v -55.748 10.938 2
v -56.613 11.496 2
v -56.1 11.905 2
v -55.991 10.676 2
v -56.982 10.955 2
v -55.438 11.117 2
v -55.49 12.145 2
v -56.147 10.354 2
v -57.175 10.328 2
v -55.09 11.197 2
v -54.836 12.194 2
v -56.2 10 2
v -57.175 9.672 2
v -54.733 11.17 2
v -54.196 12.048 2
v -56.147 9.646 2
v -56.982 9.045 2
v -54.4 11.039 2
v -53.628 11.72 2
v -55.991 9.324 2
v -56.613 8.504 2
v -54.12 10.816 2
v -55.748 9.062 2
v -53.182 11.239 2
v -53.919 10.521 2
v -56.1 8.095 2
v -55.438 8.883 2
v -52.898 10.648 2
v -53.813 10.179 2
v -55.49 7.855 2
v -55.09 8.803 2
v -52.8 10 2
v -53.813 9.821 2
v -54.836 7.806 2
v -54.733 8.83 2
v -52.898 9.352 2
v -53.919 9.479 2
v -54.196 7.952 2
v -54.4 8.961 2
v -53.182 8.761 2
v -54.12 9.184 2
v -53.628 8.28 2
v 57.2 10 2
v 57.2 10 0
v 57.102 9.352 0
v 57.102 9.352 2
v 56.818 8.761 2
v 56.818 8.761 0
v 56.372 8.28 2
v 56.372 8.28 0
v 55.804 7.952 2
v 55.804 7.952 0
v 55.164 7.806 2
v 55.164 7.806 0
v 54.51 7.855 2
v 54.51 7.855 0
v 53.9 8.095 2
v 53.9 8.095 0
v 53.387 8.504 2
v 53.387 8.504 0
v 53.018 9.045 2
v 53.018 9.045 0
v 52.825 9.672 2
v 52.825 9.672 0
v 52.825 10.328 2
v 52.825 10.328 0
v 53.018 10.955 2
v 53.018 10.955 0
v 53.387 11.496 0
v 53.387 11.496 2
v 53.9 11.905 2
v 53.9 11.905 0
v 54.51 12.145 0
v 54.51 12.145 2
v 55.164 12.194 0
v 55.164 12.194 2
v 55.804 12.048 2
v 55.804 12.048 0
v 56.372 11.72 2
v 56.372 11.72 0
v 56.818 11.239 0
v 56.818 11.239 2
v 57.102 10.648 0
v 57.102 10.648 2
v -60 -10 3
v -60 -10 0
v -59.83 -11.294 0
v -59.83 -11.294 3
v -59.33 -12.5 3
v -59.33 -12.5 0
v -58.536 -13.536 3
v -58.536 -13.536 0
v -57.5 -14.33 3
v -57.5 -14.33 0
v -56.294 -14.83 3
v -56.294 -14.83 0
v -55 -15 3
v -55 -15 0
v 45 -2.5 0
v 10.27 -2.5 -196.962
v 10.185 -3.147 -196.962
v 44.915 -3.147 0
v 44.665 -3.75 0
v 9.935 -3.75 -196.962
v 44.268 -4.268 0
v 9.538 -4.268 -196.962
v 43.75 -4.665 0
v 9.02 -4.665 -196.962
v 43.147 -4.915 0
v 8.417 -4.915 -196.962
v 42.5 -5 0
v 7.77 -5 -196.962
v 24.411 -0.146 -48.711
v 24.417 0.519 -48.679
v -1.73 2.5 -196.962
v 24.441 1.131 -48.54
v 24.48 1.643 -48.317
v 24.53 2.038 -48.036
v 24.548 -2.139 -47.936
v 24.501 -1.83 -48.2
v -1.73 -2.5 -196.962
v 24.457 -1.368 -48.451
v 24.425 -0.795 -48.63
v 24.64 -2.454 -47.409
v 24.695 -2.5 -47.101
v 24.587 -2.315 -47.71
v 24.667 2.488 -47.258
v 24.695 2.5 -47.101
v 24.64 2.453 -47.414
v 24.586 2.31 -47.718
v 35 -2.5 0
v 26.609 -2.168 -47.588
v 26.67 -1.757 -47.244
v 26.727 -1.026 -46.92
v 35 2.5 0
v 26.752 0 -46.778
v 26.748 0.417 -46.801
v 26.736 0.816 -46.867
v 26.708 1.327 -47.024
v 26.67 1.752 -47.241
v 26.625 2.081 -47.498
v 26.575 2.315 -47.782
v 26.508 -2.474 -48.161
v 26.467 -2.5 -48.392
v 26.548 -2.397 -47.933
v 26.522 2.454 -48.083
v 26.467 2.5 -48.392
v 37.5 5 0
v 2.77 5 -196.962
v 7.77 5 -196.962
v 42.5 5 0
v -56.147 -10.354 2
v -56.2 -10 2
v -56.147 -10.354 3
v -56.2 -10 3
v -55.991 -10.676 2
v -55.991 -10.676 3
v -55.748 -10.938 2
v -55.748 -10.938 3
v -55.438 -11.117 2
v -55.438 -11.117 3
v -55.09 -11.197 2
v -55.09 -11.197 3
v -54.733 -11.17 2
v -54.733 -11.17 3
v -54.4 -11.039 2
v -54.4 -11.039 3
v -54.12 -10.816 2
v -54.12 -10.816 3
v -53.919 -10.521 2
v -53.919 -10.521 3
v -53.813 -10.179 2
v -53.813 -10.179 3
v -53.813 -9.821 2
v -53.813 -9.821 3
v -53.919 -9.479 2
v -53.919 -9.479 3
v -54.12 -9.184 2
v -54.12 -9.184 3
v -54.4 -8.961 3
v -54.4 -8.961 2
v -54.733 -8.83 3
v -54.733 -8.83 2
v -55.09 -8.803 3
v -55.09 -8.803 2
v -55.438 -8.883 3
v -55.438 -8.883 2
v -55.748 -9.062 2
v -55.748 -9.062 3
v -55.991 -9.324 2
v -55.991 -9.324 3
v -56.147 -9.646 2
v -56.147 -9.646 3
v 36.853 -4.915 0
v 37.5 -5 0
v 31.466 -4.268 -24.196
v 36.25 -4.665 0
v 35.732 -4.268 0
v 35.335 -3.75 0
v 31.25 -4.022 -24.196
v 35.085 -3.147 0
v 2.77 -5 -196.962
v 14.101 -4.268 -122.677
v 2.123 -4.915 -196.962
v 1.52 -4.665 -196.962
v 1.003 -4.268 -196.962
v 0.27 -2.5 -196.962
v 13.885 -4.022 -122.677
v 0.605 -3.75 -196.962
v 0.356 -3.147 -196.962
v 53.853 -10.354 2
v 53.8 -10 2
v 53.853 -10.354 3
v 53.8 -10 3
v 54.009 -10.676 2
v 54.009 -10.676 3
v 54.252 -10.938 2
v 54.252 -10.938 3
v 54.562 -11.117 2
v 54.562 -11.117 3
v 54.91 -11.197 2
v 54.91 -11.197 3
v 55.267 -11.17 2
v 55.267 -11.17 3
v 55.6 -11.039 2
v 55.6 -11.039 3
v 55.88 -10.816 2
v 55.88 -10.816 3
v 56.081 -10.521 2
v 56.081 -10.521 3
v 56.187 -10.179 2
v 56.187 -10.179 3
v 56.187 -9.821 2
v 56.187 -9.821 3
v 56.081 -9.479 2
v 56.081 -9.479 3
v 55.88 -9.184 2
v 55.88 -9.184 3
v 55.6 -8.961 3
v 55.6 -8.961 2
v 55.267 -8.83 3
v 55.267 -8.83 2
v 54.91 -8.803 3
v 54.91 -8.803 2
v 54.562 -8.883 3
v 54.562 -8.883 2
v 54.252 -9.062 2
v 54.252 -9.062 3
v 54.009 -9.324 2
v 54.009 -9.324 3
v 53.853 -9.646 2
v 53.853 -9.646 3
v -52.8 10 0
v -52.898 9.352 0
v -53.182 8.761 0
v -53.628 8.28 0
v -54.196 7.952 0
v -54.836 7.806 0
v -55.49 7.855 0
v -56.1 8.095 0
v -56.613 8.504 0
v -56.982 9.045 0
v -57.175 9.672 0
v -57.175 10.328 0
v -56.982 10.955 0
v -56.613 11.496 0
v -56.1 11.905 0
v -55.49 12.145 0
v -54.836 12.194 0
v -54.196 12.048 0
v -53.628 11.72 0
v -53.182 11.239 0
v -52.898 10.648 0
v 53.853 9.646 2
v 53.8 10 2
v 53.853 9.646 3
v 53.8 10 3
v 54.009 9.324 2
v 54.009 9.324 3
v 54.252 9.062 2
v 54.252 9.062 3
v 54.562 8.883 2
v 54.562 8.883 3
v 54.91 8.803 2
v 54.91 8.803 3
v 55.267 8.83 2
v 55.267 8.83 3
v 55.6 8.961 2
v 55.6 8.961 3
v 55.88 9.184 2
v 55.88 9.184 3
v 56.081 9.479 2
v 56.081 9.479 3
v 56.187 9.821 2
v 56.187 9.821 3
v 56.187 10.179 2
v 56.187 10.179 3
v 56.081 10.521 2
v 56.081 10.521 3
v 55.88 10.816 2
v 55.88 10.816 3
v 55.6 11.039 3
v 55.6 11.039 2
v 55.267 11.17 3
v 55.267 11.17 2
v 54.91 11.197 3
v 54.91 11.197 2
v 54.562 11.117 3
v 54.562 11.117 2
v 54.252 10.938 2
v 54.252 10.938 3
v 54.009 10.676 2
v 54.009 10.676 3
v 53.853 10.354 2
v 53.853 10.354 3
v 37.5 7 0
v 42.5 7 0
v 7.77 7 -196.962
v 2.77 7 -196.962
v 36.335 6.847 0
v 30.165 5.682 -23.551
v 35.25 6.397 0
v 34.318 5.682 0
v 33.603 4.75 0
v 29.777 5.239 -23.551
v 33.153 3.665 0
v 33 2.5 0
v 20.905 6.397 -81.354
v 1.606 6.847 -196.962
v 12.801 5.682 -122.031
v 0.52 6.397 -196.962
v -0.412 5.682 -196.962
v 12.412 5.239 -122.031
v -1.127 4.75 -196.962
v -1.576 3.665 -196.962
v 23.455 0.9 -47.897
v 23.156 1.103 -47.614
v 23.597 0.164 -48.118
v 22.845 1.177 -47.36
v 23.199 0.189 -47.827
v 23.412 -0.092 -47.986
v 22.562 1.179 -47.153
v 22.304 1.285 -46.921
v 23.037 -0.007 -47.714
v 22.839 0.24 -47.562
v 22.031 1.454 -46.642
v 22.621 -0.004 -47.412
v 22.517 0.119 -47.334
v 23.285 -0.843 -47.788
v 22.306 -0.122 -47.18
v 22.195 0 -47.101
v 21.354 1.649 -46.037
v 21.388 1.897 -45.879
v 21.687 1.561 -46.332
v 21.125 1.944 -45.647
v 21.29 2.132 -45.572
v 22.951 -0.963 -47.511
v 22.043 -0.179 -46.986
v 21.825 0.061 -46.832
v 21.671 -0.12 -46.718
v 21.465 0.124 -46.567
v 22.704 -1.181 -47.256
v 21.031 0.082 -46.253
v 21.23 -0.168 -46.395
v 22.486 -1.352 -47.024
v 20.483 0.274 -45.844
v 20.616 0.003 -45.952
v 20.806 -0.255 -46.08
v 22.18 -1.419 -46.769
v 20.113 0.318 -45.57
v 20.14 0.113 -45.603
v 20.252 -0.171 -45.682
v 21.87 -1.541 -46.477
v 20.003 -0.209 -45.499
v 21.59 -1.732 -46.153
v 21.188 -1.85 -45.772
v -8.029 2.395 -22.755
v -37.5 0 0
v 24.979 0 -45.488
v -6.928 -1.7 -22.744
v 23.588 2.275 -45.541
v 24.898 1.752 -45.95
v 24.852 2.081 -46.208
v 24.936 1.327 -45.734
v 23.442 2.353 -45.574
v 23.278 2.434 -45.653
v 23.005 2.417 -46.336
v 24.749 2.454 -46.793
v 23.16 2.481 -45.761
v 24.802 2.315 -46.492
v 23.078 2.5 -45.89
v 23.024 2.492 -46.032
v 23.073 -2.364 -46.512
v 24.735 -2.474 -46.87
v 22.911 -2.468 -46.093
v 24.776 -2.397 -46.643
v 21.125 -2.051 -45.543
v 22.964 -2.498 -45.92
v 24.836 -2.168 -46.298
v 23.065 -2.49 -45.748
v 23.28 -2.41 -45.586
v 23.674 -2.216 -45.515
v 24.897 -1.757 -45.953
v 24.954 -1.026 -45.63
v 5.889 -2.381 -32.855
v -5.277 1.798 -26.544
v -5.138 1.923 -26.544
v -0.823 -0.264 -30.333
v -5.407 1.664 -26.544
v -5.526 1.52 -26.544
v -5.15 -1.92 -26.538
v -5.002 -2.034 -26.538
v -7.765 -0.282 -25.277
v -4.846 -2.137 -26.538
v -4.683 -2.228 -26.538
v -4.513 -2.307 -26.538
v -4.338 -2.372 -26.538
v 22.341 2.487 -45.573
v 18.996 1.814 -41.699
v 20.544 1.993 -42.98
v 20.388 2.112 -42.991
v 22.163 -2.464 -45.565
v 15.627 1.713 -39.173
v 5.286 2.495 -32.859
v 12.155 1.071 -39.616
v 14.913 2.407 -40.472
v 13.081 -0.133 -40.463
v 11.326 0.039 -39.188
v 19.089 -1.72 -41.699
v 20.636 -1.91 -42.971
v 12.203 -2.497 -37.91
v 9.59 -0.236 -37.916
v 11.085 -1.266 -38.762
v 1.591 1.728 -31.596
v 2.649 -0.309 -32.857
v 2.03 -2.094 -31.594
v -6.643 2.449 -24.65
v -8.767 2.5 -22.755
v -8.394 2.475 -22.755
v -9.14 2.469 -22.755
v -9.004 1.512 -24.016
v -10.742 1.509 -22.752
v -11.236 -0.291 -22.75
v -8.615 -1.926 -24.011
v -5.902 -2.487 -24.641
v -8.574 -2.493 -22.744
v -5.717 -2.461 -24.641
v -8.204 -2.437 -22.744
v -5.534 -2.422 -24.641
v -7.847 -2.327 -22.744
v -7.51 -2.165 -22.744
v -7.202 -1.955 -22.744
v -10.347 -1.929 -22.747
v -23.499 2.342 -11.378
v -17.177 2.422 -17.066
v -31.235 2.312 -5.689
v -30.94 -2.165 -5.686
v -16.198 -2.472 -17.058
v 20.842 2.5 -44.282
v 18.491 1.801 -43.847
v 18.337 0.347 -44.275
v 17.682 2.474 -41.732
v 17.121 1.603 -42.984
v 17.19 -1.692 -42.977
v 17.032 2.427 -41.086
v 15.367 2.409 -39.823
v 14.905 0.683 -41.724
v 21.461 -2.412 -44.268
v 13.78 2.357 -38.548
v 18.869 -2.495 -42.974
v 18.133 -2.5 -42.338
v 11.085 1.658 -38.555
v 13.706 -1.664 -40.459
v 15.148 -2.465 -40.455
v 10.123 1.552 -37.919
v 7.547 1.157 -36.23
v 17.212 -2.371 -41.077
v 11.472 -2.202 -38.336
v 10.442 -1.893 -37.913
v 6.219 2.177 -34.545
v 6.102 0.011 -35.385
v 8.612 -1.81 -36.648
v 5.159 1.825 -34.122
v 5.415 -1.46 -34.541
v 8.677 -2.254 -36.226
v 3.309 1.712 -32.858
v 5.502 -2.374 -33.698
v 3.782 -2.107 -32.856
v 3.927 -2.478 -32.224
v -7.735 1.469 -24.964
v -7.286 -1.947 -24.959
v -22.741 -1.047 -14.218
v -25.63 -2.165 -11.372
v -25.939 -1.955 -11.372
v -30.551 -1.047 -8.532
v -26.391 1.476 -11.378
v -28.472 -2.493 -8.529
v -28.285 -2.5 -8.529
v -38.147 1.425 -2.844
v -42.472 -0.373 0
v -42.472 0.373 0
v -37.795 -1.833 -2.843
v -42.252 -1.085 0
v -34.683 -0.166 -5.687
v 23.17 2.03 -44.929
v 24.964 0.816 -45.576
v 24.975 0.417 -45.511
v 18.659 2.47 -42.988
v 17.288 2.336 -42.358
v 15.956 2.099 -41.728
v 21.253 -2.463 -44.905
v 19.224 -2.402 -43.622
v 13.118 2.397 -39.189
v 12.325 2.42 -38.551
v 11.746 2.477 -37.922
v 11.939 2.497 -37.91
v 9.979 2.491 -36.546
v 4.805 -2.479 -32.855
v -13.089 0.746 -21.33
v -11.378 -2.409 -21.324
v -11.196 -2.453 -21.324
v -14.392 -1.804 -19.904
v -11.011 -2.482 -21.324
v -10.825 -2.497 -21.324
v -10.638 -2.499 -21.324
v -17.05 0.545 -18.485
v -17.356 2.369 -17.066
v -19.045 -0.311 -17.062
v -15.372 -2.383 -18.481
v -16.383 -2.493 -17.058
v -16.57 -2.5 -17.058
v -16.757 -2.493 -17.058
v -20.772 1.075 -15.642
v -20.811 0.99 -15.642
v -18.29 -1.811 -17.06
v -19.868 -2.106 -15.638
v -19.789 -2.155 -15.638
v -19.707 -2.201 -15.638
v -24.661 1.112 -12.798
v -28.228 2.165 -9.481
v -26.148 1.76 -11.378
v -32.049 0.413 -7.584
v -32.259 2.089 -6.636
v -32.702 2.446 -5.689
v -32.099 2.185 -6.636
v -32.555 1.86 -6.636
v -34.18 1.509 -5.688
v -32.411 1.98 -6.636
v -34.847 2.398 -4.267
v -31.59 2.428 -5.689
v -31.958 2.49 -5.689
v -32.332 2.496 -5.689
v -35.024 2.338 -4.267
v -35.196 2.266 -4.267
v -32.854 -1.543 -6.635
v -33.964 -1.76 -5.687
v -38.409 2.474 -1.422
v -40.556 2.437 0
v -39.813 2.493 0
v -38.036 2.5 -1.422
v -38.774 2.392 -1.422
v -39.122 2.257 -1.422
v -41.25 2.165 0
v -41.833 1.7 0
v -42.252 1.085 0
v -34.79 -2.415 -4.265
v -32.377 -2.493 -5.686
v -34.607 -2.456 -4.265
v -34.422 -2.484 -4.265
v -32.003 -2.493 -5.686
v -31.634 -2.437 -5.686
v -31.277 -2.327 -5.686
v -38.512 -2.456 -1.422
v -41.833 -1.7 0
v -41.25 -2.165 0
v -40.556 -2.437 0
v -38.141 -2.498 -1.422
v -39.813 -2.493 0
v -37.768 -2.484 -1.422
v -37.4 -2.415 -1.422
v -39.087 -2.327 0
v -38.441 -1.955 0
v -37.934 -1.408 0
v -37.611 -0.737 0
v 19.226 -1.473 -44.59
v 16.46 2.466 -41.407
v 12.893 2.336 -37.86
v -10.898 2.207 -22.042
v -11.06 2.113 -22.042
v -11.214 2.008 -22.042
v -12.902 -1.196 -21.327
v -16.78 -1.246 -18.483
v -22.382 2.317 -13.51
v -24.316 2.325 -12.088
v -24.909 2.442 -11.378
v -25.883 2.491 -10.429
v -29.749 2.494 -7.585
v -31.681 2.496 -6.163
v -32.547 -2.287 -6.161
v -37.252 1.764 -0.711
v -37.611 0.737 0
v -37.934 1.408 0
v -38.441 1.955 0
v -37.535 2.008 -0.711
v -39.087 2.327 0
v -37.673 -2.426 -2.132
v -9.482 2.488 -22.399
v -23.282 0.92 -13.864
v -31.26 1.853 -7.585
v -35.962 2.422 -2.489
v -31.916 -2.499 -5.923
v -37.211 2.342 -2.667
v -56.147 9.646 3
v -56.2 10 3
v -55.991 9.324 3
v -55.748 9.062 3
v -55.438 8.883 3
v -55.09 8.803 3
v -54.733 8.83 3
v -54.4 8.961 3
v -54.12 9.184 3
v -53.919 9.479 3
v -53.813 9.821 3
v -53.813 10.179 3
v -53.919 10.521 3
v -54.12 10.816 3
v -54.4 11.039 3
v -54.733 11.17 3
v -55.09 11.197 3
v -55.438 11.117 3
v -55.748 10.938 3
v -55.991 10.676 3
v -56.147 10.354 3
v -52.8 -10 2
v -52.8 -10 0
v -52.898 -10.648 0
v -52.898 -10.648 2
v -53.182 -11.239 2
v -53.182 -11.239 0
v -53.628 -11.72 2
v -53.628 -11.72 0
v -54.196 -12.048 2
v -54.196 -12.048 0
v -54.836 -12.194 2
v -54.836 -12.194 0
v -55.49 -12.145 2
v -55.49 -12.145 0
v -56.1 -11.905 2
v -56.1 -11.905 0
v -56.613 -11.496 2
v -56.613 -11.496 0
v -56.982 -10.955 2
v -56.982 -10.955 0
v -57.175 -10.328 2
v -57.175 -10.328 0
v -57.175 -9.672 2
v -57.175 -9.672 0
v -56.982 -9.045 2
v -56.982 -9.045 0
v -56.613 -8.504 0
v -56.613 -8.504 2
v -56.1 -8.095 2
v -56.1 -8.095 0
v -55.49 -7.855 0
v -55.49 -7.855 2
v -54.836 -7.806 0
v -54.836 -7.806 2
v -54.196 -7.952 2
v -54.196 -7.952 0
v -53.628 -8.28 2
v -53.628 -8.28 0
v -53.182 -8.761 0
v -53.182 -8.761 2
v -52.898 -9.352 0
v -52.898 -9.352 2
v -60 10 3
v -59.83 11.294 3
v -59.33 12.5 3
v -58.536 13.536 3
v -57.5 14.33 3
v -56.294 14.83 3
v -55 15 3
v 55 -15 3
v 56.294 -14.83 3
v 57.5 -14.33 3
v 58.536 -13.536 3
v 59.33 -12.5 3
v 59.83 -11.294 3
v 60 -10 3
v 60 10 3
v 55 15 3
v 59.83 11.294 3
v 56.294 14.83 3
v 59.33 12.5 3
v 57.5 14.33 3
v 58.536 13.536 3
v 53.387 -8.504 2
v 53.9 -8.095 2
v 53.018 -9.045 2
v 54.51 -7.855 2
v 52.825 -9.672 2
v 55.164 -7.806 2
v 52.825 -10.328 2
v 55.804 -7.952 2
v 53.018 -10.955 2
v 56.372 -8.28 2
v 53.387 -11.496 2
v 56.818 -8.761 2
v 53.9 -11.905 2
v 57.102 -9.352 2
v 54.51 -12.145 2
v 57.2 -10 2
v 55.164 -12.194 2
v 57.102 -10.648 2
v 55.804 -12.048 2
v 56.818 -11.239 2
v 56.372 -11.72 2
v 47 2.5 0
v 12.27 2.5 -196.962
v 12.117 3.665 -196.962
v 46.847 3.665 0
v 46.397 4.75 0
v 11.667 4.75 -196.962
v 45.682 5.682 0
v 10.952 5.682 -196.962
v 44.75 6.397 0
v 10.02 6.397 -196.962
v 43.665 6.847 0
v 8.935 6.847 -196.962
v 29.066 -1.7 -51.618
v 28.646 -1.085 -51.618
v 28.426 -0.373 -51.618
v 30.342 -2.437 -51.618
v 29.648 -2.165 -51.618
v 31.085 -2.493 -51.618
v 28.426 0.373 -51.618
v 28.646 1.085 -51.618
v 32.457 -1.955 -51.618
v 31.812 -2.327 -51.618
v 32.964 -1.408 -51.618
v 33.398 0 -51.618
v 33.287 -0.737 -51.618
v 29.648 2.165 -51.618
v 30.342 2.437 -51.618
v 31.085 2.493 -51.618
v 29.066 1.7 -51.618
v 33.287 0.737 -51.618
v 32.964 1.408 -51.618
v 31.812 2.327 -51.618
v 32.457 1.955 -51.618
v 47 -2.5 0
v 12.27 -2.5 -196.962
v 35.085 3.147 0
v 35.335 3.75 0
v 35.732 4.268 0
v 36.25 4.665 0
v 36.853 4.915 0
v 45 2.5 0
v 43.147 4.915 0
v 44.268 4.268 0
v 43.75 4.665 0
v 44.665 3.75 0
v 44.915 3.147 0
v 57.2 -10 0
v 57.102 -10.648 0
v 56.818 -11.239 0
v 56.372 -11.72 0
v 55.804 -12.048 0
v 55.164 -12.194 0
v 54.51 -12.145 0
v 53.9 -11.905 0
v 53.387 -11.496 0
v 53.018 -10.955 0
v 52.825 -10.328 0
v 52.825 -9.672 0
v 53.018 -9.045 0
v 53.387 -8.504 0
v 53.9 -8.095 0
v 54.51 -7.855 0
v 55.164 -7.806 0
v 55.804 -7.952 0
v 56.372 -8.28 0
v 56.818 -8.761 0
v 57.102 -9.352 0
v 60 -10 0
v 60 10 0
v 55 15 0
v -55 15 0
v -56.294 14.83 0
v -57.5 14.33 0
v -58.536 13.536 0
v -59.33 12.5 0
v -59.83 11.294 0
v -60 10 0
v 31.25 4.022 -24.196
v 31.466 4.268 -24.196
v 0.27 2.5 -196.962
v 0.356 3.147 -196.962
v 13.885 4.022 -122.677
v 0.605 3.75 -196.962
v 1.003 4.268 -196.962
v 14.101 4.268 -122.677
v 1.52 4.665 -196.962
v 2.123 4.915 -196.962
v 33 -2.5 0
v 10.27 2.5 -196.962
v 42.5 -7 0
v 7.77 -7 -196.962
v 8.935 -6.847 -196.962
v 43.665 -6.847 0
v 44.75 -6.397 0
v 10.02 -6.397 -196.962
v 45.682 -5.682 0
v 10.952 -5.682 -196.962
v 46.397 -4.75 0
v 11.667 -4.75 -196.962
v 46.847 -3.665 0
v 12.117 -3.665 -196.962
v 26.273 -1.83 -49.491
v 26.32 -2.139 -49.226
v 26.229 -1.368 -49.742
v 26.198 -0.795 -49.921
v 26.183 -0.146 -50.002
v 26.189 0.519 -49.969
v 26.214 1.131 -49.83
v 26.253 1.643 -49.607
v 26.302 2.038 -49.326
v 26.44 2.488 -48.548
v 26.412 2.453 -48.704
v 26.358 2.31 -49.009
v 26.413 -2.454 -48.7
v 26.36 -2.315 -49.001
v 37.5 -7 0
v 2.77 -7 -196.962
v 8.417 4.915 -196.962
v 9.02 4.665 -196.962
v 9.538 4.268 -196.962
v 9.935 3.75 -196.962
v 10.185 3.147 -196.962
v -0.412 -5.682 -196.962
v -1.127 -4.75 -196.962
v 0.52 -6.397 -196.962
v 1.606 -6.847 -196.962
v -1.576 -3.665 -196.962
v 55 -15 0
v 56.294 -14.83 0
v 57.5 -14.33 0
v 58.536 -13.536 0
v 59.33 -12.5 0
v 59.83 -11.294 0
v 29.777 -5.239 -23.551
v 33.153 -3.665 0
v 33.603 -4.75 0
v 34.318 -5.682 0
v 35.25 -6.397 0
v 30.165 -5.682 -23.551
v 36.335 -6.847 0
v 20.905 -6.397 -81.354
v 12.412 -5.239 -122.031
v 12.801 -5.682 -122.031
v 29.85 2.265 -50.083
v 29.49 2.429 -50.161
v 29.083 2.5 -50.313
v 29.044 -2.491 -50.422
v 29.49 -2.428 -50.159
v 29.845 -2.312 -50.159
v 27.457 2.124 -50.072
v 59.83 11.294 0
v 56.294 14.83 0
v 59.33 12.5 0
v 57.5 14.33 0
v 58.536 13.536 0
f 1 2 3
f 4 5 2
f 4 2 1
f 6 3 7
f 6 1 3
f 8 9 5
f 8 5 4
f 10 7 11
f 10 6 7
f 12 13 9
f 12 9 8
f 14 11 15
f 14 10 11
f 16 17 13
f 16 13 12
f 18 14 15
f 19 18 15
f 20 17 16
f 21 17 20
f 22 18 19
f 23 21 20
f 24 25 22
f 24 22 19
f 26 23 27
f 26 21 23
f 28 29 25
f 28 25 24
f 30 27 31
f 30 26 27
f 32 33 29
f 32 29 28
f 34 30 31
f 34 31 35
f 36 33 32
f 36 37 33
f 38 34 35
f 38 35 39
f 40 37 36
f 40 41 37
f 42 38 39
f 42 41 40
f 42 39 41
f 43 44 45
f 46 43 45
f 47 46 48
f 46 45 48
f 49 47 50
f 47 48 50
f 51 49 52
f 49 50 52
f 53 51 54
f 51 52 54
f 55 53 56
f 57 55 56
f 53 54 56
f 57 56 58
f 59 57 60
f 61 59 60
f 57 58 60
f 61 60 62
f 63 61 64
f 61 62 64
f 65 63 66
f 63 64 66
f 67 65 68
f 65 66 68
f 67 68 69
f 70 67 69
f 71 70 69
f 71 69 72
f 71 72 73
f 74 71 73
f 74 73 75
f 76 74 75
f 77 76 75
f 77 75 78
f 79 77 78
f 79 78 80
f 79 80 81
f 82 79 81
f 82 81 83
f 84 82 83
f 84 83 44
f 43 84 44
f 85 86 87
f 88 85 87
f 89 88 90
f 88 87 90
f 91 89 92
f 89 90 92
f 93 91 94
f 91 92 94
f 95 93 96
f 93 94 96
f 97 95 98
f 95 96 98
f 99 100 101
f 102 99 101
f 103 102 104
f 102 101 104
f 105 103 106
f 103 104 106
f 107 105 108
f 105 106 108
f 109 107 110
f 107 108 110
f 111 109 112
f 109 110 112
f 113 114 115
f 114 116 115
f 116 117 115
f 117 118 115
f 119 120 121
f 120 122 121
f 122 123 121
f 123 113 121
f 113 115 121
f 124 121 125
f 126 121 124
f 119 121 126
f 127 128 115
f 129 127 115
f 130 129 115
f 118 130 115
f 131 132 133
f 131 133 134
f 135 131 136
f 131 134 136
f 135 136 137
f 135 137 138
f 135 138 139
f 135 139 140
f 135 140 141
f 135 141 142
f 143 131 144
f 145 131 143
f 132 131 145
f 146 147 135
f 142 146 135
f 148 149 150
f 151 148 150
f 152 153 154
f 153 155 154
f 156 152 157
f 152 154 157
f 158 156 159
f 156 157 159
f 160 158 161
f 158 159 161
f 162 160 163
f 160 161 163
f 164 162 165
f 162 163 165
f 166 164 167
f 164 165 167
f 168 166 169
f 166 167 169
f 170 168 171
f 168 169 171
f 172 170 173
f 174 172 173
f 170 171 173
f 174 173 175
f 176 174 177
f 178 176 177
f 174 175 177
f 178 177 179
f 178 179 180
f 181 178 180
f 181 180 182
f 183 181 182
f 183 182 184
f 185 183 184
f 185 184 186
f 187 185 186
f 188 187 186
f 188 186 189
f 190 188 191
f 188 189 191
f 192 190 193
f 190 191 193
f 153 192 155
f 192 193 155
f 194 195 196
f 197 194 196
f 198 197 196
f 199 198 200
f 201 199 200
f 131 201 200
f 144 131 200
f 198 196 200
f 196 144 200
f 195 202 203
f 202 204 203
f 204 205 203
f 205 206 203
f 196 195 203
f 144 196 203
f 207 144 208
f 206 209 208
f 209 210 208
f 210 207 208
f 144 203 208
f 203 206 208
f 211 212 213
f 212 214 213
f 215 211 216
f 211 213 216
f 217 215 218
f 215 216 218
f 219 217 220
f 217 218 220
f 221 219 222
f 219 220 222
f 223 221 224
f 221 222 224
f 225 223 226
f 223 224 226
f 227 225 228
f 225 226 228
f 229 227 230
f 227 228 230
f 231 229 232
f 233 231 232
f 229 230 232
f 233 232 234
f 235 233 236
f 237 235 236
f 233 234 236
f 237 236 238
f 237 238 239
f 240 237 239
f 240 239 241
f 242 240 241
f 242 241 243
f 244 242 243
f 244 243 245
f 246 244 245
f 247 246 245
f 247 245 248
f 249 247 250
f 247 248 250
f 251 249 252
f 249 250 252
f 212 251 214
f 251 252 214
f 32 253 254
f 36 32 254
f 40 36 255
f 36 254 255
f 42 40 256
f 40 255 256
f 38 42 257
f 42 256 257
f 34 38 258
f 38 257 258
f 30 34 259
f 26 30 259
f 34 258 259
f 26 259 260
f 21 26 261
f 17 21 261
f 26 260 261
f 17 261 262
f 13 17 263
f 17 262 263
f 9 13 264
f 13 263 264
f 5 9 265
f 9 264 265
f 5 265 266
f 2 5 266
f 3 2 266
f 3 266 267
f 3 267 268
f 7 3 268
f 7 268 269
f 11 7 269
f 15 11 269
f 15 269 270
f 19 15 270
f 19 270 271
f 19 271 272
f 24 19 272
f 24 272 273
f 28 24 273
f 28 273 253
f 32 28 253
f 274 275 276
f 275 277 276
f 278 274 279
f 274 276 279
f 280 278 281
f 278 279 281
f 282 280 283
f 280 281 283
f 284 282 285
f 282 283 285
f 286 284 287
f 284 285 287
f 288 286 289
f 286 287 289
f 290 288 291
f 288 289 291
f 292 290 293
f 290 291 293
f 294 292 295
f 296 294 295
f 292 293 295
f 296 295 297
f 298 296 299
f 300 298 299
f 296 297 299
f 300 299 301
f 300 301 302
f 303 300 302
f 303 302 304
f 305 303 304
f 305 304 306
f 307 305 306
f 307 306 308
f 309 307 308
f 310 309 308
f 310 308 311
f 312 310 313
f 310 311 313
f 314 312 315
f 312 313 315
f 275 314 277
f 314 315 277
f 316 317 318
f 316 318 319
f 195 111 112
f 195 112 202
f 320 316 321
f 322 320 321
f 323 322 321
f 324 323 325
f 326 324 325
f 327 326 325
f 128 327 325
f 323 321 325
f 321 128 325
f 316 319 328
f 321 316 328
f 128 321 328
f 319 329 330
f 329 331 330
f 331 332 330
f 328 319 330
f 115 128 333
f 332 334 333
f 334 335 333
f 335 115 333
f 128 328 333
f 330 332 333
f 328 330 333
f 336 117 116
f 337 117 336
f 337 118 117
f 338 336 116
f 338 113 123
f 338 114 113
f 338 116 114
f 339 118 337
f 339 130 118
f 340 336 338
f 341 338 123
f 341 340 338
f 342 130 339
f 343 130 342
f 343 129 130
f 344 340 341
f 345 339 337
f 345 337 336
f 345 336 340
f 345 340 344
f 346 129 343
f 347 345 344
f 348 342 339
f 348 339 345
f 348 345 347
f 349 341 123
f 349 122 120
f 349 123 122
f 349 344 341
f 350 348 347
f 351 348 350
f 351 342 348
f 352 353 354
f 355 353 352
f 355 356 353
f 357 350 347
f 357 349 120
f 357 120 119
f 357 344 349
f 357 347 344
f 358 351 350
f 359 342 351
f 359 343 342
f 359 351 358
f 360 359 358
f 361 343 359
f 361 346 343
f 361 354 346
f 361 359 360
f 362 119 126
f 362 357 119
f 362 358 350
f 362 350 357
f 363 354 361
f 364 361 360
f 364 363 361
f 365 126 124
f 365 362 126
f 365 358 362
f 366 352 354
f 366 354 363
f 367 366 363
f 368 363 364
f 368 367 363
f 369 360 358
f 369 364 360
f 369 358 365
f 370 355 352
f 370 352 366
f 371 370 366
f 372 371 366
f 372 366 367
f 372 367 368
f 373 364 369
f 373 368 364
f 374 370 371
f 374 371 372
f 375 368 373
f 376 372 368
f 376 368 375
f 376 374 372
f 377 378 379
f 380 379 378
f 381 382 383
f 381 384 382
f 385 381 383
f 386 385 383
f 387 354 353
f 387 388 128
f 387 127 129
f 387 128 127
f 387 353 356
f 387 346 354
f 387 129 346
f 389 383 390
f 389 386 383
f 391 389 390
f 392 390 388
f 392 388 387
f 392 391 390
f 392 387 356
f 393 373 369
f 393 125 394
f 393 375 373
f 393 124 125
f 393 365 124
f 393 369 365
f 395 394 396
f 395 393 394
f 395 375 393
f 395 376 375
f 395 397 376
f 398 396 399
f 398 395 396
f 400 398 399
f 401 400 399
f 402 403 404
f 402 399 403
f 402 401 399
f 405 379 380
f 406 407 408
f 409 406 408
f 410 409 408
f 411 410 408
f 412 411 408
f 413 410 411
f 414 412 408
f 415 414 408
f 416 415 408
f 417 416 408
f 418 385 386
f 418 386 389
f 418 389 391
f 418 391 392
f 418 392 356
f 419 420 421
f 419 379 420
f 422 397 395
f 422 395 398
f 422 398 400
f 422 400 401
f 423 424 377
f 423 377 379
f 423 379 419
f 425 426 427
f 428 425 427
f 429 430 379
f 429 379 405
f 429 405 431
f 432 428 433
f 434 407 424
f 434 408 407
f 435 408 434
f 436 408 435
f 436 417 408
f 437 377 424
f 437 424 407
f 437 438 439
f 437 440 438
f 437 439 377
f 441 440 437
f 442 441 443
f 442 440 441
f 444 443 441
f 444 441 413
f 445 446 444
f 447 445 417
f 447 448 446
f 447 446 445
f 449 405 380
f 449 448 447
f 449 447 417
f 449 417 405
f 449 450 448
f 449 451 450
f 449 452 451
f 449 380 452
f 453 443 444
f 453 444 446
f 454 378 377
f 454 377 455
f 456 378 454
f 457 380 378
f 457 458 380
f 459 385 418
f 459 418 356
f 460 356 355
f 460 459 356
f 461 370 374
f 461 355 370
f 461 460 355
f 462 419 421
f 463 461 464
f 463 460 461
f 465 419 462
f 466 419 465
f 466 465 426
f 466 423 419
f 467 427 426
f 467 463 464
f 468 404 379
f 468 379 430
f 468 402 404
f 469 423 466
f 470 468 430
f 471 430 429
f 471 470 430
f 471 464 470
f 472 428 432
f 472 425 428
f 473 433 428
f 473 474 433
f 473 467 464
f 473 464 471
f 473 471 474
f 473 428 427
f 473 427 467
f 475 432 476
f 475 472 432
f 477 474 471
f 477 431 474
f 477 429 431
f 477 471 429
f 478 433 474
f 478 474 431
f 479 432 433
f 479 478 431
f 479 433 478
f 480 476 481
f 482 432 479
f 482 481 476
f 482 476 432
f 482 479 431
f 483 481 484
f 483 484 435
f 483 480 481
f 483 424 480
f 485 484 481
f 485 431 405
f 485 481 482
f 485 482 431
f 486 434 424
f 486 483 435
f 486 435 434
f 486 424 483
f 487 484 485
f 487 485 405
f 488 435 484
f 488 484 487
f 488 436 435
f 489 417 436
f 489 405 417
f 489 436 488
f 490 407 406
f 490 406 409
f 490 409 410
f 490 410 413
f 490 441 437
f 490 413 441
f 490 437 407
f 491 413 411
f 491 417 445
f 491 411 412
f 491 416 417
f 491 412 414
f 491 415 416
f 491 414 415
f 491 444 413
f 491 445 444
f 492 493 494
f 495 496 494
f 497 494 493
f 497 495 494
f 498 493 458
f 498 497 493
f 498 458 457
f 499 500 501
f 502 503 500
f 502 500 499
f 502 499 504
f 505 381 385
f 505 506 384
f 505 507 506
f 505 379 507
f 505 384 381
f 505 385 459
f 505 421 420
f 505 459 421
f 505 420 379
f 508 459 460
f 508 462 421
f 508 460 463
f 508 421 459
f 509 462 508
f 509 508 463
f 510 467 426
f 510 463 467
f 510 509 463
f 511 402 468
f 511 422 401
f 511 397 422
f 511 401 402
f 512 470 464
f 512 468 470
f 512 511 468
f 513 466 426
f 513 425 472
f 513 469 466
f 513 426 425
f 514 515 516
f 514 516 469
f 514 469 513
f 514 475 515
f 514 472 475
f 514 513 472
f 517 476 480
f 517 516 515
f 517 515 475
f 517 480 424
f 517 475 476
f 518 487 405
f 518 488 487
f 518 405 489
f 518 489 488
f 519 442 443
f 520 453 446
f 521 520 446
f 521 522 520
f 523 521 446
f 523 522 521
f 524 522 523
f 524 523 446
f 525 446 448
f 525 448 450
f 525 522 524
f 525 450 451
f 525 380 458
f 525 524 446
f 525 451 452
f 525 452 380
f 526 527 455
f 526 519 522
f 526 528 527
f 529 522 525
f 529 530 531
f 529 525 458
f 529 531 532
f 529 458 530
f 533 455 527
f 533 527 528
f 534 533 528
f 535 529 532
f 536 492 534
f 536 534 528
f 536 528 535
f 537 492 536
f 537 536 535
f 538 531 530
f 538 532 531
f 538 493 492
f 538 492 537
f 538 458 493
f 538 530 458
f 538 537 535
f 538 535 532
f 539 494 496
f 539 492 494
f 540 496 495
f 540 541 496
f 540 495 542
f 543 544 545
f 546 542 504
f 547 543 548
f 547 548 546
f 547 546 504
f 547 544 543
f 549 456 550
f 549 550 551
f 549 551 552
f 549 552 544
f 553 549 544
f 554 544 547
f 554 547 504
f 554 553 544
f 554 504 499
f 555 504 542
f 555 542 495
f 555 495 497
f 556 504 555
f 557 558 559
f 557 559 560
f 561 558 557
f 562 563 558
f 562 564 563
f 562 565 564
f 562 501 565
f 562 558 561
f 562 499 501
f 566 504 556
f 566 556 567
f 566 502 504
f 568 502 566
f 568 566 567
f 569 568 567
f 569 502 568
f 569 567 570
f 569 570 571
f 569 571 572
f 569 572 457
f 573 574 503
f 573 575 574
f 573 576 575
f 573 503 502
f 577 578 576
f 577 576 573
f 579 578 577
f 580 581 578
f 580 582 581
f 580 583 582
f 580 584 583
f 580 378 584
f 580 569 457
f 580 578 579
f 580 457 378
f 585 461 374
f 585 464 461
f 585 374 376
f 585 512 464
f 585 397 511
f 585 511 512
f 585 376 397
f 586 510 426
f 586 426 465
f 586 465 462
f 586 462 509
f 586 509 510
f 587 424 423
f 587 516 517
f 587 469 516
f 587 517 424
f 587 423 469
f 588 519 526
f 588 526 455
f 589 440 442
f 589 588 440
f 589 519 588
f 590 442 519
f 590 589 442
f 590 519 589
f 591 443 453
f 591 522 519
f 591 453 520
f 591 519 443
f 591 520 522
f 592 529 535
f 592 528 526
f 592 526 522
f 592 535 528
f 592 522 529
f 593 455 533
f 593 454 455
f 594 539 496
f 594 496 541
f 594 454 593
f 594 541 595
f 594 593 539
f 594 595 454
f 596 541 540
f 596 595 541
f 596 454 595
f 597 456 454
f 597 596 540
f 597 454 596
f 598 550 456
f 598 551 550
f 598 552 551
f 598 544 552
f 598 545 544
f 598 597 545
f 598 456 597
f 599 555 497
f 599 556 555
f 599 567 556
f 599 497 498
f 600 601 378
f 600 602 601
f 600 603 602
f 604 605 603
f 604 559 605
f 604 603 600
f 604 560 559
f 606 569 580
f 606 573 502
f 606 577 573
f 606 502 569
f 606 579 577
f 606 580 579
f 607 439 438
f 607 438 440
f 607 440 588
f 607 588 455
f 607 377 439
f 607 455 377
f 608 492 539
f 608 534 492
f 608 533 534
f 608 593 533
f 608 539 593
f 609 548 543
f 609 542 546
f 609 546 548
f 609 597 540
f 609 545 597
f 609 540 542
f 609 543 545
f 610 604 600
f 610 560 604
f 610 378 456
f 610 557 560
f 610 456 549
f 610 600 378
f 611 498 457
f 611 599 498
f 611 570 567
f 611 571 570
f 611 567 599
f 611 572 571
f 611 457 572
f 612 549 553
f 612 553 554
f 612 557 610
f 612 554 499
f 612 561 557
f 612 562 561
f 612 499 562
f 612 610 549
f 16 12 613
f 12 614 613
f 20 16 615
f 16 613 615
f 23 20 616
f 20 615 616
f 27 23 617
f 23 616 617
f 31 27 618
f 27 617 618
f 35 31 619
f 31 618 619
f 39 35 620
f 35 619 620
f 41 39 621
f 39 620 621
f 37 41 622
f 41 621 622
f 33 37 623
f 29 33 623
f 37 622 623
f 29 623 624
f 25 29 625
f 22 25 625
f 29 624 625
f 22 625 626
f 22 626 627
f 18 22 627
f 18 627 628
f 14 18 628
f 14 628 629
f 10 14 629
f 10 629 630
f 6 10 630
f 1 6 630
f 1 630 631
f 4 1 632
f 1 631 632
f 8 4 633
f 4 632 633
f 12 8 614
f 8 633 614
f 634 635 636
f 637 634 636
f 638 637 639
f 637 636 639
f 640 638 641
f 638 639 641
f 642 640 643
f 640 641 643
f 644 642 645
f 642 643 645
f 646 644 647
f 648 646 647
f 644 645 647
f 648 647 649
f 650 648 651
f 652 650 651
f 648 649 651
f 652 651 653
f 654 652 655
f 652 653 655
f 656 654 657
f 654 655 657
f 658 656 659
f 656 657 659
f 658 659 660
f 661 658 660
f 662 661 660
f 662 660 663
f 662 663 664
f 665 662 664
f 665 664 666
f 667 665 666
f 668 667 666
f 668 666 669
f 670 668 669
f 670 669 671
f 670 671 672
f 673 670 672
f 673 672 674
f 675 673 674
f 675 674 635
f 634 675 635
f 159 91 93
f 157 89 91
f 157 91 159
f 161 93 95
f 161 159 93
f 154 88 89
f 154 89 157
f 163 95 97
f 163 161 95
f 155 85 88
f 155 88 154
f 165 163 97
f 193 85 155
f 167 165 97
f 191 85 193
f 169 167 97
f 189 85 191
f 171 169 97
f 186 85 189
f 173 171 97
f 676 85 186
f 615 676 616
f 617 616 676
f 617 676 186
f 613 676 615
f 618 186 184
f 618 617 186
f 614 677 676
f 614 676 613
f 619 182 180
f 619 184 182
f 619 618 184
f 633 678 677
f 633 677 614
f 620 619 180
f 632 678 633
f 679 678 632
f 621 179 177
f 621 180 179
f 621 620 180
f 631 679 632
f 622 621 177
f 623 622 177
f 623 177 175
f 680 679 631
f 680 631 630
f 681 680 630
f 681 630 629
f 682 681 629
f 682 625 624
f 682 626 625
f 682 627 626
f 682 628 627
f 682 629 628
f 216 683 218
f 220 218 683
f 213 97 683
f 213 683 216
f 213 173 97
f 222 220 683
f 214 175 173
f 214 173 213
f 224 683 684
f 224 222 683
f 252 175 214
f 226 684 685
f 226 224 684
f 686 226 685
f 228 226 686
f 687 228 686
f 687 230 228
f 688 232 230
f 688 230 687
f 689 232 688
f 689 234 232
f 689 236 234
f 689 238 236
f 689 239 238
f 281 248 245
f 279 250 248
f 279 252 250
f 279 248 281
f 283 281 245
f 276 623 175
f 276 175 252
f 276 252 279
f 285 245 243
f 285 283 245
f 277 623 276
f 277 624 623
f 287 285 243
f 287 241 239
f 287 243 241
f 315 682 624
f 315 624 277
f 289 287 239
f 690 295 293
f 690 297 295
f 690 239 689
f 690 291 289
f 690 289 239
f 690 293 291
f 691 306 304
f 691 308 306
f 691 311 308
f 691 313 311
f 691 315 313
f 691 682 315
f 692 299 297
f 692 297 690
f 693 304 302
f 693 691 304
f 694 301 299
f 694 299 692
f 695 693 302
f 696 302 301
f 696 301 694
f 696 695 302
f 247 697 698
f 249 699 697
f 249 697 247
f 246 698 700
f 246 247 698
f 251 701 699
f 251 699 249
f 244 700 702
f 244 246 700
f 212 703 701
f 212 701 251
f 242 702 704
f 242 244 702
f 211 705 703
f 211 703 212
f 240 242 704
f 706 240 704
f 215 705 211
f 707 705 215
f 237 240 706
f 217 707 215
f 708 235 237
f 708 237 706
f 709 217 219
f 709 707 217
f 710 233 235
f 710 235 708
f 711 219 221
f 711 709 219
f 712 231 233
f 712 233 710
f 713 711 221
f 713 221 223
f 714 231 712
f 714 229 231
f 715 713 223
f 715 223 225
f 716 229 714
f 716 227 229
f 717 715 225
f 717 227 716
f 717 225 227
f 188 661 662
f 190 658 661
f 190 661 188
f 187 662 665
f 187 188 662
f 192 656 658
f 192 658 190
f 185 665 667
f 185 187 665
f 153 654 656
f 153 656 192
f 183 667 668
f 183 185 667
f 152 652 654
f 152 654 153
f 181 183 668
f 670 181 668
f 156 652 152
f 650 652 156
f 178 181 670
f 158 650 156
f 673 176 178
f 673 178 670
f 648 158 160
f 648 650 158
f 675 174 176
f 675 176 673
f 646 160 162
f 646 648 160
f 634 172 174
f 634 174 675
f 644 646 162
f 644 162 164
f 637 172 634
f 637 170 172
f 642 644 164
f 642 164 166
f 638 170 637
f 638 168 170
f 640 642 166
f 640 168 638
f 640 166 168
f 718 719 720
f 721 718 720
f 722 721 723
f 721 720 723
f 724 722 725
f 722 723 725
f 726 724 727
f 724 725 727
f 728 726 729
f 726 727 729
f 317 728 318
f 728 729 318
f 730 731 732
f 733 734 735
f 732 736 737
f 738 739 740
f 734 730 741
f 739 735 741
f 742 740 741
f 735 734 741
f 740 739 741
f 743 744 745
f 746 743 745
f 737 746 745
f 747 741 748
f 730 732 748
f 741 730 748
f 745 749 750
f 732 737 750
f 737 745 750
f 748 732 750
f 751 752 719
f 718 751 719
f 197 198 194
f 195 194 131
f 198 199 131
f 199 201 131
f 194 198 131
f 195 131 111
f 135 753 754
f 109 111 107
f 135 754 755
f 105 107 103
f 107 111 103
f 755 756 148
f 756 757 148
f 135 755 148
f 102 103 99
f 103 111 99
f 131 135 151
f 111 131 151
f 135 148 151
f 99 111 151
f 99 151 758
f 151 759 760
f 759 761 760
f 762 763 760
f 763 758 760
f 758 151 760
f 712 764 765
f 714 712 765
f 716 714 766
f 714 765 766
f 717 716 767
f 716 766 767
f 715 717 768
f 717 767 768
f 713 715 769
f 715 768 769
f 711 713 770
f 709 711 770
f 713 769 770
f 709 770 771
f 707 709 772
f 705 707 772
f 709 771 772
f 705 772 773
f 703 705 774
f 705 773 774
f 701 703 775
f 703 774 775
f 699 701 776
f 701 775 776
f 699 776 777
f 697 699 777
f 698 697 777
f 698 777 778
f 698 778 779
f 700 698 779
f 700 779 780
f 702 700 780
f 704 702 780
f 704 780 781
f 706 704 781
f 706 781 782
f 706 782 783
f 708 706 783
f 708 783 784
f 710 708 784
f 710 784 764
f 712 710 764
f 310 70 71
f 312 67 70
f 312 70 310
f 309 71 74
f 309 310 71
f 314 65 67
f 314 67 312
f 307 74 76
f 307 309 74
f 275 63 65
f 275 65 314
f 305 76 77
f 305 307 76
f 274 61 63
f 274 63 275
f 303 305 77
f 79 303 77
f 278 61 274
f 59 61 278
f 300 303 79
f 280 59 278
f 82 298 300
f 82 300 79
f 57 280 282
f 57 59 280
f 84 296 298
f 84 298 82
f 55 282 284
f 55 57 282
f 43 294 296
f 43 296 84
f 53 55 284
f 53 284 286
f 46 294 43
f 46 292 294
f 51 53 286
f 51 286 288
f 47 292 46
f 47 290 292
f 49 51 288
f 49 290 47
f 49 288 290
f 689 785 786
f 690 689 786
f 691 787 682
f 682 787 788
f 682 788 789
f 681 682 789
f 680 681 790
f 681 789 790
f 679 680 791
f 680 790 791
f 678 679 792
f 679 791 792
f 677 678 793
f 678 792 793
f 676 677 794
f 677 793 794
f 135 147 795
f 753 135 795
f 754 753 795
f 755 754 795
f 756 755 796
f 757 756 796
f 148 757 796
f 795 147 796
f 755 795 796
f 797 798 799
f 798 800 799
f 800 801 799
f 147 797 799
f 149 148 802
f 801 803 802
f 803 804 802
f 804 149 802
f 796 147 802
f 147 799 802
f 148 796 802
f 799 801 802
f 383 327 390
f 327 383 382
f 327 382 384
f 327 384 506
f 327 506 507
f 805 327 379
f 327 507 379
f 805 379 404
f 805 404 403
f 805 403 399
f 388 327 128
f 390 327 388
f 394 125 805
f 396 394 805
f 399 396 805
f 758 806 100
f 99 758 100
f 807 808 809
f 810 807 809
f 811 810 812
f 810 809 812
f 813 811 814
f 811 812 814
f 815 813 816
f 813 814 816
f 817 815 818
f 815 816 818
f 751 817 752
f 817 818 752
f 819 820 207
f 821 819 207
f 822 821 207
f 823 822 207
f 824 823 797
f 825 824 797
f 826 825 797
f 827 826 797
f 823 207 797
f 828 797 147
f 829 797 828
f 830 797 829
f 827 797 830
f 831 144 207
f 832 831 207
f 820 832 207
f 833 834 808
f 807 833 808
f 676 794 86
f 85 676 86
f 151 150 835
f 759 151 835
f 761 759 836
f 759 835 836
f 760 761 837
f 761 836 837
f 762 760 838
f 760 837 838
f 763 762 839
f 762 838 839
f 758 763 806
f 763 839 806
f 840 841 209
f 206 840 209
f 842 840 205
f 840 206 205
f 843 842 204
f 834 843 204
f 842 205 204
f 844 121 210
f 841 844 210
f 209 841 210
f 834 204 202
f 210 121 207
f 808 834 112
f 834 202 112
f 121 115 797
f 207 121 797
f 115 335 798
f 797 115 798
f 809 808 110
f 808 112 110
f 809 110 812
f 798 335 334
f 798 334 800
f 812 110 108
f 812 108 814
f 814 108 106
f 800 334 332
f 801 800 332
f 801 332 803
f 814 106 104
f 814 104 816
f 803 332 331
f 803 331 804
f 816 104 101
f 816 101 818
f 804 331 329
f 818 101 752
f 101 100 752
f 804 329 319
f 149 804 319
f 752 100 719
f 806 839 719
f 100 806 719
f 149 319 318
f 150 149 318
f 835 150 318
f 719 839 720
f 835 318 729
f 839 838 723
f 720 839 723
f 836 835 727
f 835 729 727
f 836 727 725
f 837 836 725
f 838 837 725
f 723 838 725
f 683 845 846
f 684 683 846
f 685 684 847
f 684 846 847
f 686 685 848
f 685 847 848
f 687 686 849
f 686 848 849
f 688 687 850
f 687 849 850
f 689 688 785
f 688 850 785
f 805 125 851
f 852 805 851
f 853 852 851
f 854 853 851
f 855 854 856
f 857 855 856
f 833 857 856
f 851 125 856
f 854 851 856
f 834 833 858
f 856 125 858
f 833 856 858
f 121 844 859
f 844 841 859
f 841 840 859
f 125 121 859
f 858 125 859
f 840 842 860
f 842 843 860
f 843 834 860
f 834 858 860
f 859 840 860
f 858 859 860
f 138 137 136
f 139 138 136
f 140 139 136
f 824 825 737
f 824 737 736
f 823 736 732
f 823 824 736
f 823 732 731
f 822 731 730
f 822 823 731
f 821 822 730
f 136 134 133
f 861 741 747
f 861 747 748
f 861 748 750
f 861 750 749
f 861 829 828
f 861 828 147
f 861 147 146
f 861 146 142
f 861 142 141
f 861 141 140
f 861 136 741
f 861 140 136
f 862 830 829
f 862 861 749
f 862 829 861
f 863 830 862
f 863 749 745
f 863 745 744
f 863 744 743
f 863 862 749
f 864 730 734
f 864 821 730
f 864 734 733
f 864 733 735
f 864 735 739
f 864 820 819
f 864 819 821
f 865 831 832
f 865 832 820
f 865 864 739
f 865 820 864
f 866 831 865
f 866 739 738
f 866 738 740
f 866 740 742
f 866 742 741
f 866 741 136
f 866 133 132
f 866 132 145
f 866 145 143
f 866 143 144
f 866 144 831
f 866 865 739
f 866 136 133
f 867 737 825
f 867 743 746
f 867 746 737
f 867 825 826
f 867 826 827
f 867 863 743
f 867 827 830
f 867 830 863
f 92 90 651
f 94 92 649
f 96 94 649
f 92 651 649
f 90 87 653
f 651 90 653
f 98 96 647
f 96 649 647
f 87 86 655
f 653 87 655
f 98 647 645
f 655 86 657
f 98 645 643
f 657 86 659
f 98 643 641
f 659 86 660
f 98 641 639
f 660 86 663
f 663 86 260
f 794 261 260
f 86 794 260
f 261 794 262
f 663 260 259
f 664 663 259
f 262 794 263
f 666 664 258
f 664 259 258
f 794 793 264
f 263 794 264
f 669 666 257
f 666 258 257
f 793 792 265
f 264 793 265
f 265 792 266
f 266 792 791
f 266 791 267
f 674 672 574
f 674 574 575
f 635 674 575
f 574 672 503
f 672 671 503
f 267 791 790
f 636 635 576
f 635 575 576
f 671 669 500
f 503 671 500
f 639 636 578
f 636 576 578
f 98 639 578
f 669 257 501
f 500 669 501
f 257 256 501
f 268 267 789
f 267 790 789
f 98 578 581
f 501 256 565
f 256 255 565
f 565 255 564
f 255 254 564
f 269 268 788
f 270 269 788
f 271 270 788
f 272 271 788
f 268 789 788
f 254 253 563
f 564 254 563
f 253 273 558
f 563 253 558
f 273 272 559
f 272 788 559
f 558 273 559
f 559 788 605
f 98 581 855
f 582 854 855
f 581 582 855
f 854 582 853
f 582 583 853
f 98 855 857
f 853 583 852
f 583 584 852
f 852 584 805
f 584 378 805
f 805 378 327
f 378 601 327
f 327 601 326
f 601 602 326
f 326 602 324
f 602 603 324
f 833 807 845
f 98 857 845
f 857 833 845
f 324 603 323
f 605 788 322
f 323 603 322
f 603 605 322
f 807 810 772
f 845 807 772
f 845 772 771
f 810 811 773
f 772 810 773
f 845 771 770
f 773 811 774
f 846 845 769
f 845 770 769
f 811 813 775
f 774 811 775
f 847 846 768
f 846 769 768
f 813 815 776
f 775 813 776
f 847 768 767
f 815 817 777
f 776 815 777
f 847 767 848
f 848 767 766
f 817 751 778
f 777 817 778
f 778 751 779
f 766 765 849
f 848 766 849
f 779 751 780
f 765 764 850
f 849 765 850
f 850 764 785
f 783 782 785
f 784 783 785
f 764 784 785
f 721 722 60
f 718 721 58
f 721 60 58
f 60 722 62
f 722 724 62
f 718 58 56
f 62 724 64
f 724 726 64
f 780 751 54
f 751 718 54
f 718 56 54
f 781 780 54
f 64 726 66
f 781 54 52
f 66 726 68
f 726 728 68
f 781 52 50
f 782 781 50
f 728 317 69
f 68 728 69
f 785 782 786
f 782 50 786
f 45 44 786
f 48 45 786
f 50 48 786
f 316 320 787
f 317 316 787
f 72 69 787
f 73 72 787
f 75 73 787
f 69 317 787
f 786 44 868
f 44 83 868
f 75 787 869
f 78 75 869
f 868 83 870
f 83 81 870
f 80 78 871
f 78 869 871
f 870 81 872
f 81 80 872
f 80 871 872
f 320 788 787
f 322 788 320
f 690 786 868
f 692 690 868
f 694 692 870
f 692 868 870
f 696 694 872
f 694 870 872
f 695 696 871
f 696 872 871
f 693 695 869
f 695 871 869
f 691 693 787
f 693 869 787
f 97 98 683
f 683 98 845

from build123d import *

# Parameters (mm, degrees)
F1_R           = 2.5
F2_DEPTH       = 3
F3_D           = 2.4
F3_CBORE_D     = 4.4
F3_CBORE_DEPTH = 2


with BuildPart() as f2:
    # F1 (on Top) → F2 (new body)
    with BuildSketch(Plane.XY):
        with BuildLine():
            Line((-55, -15), (55, -15))
            ThreePointArc((55, -15), (58.5355339059, -13.5355339059), (60, -10))
            Line((60, -10), (60, 10))
            ThreePointArc((60, 10), (58.5355339059, 13.5355339059), (55, 15))
            Line((55, 15), (-55, 15))
            ThreePointArc((-55, 15), (-58.5355339059, 13.5355339059), (-60, 10))
            Line((-60, 10), (-60, -10))
            ThreePointArc((-60, -10), (-58.5355339059, -13.5355339059), (-55, -15))
        make_face()
        with Locations((-40, 0)):
            Circle(F1_R, mode=Mode.SUBTRACT)
        with BuildLine():
            ThreePointArc((42.5, 7), (45.6819805153, 5.6819805153), (47, 2.5))
            Line((47, 2.5), (47, -2.5))
            ThreePointArc((47, -2.5), (45.6819805153, -5.6819805153), (42.5, -7))
            Line((42.5, -7), (37.5, -7))
            ThreePointArc((37.5, -7), (34.3180194847, -5.6819805153), (33, -2.5))
            Line((33, -2.5), (33, 2.5))
            ThreePointArc((33, 2.5), (34.3180194847, 5.6819805153), (37.5, 7))
            Line((37.5, 7), (42.5, 7))
        make_face(mode=Mode.SUBTRACT)
        with BuildLine():
            Line((47, -2.5), (47, 2.5))
            ThreePointArc((47, 2.5), (45.6819805153, 5.6819805153), (42.5, 7))
            Line((42.5, 7), (37.5, 7))
            ThreePointArc((37.5, 7), (34.3180194847, 5.6819805153), (33, 2.5))
            Line((33, 2.5), (33, -2.5))
            ThreePointArc((33, -2.5), (34.3180194847, -5.6819805153), (37.5, -7))
            Line((37.5, -7), (42.5, -7))
            ThreePointArc((42.5, -7), (45.6819805153, -5.6819805153), (47, -2.5))
        make_face()
        with BuildLine():
            ThreePointArc((35, 2.5), (35.732233047, 4.267766953), (37.5, 5))
            Line((37.5, 5), (42.5, 5))
            ThreePointArc((42.5, 5), (44.267766953, 4.267766953), (45, 2.5))
            Line((45, 2.5), (45, -2.5))
            ThreePointArc((45, -2.5), (44.267766953, -4.267766953), (42.5, -5))
            Line((42.5, -5), (37.5, -5))
            ThreePointArc((37.5, -5), (35.732233047, -4.267766953), (35, -2.5))
            Line((35, -2.5), (35, 2.5))
        make_face(mode=Mode.SUBTRACT)
        with BuildLine():
            Line((42.5, 5), (37.5, 5))
            ThreePointArc((37.5, 5), (35.732233047, 4.267766953), (35, 2.5))
            Line((35, 2.5), (35, -2.5))
            ThreePointArc((35, -2.5), (35.732233047, -4.267766953), (37.5, -5))
            Line((37.5, -5), (42.5, -5))
            ThreePointArc((42.5, -5), (44.267766953, -4.267766953), (45, -2.5))
            Line((45, -2.5), (45, 2.5))
            ThreePointArc((45, 2.5), (44.267766953, 4.267766953), (42.5, 5))
        make_face()
        with Locations((-40, 0)):
            Circle(F1_R)
    extrude(amount=F2_DEPTH)

    # F3 (through all)
    with Locations(Plane(origin=(0, 0, 0), x_dir=(1, 0, 0), z_dir=(0, 0, -1))):
        with Locations((55, -10), (-55, -10), (-55, 10), (55, 10)):
            CounterBoreHole(F3_D / 2, F3_CBORE_D / 2, F3_CBORE_DEPTH)

    # F5: sweep along a path in F4
    with BuildLine(Plane.XZ) as f5_path:
        Line((40, 0), (5.2703644666, -196.9615506024))
    # F1 (on Top) → F5 (sweep)
    with BuildSketch(Plane.XY):
        with BuildLine():
            Line((47, -2.5), (47, 2.5))
            ThreePointArc((47, 2.5), (45.6819805153, 5.6819805153), (42.5, 7))
            Line((42.5, 7), (37.5, 7))
            ThreePointArc((37.5, 7), (34.3180194847, 5.6819805153), (33, 2.5))
            Line((33, 2.5), (33, -2.5))
            ThreePointArc((33, -2.5), (34.3180194847, -5.6819805153), (37.5, -7))
            Line((37.5, -7), (42.5, -7))
            ThreePointArc((42.5, -7), (45.6819805153, -5.6819805153), (47, -2.5))
        make_face()
        with BuildLine():
            ThreePointArc((35, 2.5), (35.732233047, 4.267766953), (37.5, 5))
            Line((37.5, 5), (42.5, 5))
            ThreePointArc((42.5, 5), (44.267766953, 4.267766953), (45, 2.5))
            Line((45, 2.5), (45, -2.5))
            ThreePointArc((45, -2.5), (44.267766953, -4.267766953), (42.5, -5))
            Line((42.5, -5), (37.5, -5))
            ThreePointArc((37.5, -5), (35.732233047, -4.267766953), (35, -2.5))
            Line((35, -2.5), (35, 2.5))
        make_face(mode=Mode.SUBTRACT)
    sweep(path=f5_path.line)

    # F6: sweep along a path in F4
    with BuildLine(Plane.XZ) as f6_path:
        Line((30.898421792, -51.6176150207), (-40, 0))
    # F1 (on Top) → F6 (sweep)
    with BuildSketch(Plane.XY):
        with Locations((-40, 0)):
            Circle(F1_R)
    sweep(path=f6_path.line)


solid = f2.part
